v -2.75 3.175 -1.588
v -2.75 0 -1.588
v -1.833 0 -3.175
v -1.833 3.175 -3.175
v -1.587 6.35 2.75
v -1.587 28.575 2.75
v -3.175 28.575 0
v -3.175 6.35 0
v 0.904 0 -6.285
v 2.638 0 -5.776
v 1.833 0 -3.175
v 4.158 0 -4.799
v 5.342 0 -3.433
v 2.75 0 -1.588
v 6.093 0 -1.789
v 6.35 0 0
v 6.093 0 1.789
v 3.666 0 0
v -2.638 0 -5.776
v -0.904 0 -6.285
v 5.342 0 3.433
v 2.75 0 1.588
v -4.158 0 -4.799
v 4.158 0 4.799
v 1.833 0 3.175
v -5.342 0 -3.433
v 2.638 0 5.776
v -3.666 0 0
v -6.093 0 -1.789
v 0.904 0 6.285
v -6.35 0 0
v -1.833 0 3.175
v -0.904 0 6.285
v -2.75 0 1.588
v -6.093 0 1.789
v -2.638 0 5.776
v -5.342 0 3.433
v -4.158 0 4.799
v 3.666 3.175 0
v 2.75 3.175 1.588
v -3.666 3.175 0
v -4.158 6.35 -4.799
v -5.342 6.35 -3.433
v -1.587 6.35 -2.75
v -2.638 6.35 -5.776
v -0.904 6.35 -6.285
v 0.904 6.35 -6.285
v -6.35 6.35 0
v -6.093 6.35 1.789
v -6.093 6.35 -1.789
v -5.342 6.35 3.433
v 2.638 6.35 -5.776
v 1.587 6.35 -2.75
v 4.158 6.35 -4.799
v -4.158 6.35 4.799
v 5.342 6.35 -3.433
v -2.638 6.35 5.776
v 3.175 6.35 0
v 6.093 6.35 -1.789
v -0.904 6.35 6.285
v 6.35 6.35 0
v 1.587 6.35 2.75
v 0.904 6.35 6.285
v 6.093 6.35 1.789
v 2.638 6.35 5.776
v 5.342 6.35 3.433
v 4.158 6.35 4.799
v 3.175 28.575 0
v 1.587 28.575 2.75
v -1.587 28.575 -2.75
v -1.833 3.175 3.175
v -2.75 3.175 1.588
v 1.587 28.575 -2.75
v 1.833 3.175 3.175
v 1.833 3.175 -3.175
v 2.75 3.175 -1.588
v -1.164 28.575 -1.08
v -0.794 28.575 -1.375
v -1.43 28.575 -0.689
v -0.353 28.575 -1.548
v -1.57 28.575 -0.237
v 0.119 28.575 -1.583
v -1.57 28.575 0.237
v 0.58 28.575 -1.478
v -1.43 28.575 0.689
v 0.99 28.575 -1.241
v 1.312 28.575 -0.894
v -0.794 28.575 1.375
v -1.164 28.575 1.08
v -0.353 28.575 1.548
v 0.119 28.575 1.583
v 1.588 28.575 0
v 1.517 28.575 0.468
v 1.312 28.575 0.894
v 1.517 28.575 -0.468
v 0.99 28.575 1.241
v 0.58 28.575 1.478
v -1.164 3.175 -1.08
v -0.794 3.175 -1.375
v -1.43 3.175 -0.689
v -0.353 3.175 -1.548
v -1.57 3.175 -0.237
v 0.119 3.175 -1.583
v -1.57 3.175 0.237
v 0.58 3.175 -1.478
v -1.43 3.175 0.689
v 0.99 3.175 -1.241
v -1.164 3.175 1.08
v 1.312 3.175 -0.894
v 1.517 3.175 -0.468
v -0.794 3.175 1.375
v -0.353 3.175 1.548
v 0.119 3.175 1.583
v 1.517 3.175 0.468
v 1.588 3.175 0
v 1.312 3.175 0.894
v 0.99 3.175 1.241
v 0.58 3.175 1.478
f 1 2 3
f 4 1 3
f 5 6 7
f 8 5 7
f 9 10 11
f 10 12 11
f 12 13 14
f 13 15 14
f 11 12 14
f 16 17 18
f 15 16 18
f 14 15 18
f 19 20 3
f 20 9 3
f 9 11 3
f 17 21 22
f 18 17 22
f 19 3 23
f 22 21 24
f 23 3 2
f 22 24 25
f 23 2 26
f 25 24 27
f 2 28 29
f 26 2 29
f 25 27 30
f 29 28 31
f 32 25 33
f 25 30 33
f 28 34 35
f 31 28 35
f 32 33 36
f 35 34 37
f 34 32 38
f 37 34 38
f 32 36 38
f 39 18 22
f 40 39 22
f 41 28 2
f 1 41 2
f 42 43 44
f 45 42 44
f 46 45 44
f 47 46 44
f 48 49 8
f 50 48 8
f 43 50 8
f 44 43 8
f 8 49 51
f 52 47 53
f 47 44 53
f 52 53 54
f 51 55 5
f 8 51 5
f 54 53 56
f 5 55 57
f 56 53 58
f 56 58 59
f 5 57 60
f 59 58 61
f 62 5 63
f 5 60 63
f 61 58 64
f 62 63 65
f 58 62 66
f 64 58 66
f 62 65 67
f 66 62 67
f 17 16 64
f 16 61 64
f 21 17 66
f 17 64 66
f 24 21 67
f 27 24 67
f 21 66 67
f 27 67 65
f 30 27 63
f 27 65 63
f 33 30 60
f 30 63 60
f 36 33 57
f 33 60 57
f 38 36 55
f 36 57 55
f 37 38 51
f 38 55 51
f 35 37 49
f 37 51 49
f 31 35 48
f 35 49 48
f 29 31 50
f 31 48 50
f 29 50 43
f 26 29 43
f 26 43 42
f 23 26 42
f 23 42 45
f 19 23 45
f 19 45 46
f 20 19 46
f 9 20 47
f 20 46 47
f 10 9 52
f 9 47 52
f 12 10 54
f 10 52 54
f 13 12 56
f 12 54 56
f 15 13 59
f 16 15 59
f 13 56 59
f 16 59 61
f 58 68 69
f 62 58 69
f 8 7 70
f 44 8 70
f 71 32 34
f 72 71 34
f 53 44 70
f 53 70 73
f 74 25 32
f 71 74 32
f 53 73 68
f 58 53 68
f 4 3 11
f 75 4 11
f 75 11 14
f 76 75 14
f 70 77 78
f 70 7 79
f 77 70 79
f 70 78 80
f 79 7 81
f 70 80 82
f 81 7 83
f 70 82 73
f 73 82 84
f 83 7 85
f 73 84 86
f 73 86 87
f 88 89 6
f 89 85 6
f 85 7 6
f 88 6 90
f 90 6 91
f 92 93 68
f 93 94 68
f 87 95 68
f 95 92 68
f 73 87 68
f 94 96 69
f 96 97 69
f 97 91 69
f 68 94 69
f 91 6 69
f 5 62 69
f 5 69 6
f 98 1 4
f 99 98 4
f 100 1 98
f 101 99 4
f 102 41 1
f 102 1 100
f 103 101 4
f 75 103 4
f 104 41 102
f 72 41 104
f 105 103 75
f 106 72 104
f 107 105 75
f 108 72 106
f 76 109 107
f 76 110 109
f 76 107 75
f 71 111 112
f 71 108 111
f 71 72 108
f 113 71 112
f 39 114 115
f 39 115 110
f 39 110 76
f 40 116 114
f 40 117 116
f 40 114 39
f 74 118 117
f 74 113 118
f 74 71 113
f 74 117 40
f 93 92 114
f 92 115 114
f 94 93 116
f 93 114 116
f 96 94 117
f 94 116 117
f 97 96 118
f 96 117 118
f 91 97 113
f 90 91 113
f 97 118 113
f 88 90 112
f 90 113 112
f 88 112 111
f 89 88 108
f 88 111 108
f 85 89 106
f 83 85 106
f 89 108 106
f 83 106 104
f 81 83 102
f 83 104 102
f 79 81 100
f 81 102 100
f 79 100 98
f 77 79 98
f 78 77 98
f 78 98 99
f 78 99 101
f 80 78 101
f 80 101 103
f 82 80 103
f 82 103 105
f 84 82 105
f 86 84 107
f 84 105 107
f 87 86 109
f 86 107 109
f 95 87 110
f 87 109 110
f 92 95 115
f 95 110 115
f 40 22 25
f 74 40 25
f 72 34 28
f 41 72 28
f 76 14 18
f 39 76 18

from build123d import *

# Parameters (mm, degrees)
CUT_EXTRUDE3_DEPTH = 22.225
SKETCH4_R          = 3.175
CUT_EXTRUDE4_DEPTH = 3.175


with BuildPart() as part:
    # Sketch2 → Revolve1 (revolve)
    with BuildSketch(Plane.XY):
        Polygon((6.35, 0), (6.35, 6.35), (3.175, 6.35), (3.175, 28.575), (1.5875, 28.575), (1.5875, 3.175), (3.175, 3.175), (3.175, 0), align=None)
    revolve(axis=Axis((0, 41.227012609, 0), (0, -1, 0)))

    # Sketch3 → Cut-Extrude3 (cut)
    with BuildSketch(Plane(origin=(0, 28.575, 0), x_dir=(1, 0, 0), z_dir=(0, 1, 0))):
        with BuildLine():
            Line((-3.175, 0), (-1.5875, 2.749630657))
            ThreePointArc((-1.5875, 2.749630657), (-2.749630657, 1.5875), (-3.175, 0))
        make_face()
        with BuildLine():
            ThreePointArc((1.5875, 2.749630657), (0, 3.175), (-1.5875, 2.749630657))
            Line((-1.5875, 2.749630657), (1.5875, 2.749630657))
        make_face()
        with BuildLine():
            ThreePointArc((3.175, 0), (2.749630657, 1.5875), (1.5875, 2.749630657))
            Line((1.5875, 2.749630657), (3.175, 0))
        make_face()
        with BuildLine():
            ThreePointArc((1.5875, -2.749630657), (2.749630657, -1.5875), (3.175, 0))
            Line((3.175, 0), (1.5875, -2.749630657))
        make_face()
        with BuildLine():
            Line((1.5875, -2.749630657), (-1.5875, -2.749630657))
            ThreePointArc((-1.5875, -2.749630657), (0, -3.175), (1.5875, -2.749630657))
        make_face()
        with BuildLine():
            Line((-1.5875, -2.749630657), (-3.175, 0))
            ThreePointArc((-3.175, 0), (-2.749630657, -1.5875), (-1.5875, -2.749630657))
        make_face()
    extrude(amount=-CUT_EXTRUDE3_DEPTH, mode=Mode.SUBTRACT)

    # Sketch4 → Cut-Extrude4 (cut)
    with BuildSketch(Plane.XZ):
        with BuildLine():
            ThreePointArc((-2.74963064, 1.58750003), (-1.587499985, 2.749630666), (0, 3.175))
            Line((0, 3.175), (-1.833087105, 3.175))
            Line((-1.833087105, 3.175), (-2.74963064, 1.58750003))
        make_face()
        with BuildLine():
            Line((2.749630611, 1.58750008), (1.833087105, 3.175))
            Line((1.833087105, 3.175), (0, 3.175))
            ThreePointArc((0, 3.175), (1.58749996, 2.74963068), (2.749630611, 1.58750008))
        make_face()
        with BuildLine():
            Line((3.666174209, 0), (2.749630611, 1.58750008))
            ThreePointArc((2.749630611, 1.58750008), (3.066814486, 0.821750513), (3.175, 0))
            ThreePointArc((3.175, 0), (3.066814483, -0.821750528), (2.749630596, -1.587500106))
            Line((2.749630596, -1.587500106), (3.666174209, 0))
        make_face()
        with BuildLine():
            Line((1.833087105, -3.175), (2.749630596, -1.587500106))
            ThreePointArc((2.749630596, -1.587500106), (1.587499947, -2.749630688), (0, -3.175))
            Line((0, -3.175), (1.833087105, -3.175))
        make_face()
        with BuildLine():
            ThreePointArc((0, -3.175), (-1.587499999, -2.749630657), (-2.749630656, -1.587500001))
            Line((-2.749630656, -1.587500001), (-1.833087105, -3.175))
            Line((-1.833087105, -3.175), (0, -3.175))
        make_face()
        with BuildLine():
            ThreePointArc((-2.749630656, -1.587500001), (-3.175, 1.7e-08), (-2.74963064, 1.58750003))
            Line((-2.74963064, 1.58750003), (-3.666174209, 0))
            Line((-3.666174209, 0), (-2.749630656, -1.587500001))
        make_face()
        Circle(SKETCH4_R)
    extrude(amount=-CUT_EXTRUDE4_DEPTH, mode=Mode.SUBTRACT)


solid = part.part
